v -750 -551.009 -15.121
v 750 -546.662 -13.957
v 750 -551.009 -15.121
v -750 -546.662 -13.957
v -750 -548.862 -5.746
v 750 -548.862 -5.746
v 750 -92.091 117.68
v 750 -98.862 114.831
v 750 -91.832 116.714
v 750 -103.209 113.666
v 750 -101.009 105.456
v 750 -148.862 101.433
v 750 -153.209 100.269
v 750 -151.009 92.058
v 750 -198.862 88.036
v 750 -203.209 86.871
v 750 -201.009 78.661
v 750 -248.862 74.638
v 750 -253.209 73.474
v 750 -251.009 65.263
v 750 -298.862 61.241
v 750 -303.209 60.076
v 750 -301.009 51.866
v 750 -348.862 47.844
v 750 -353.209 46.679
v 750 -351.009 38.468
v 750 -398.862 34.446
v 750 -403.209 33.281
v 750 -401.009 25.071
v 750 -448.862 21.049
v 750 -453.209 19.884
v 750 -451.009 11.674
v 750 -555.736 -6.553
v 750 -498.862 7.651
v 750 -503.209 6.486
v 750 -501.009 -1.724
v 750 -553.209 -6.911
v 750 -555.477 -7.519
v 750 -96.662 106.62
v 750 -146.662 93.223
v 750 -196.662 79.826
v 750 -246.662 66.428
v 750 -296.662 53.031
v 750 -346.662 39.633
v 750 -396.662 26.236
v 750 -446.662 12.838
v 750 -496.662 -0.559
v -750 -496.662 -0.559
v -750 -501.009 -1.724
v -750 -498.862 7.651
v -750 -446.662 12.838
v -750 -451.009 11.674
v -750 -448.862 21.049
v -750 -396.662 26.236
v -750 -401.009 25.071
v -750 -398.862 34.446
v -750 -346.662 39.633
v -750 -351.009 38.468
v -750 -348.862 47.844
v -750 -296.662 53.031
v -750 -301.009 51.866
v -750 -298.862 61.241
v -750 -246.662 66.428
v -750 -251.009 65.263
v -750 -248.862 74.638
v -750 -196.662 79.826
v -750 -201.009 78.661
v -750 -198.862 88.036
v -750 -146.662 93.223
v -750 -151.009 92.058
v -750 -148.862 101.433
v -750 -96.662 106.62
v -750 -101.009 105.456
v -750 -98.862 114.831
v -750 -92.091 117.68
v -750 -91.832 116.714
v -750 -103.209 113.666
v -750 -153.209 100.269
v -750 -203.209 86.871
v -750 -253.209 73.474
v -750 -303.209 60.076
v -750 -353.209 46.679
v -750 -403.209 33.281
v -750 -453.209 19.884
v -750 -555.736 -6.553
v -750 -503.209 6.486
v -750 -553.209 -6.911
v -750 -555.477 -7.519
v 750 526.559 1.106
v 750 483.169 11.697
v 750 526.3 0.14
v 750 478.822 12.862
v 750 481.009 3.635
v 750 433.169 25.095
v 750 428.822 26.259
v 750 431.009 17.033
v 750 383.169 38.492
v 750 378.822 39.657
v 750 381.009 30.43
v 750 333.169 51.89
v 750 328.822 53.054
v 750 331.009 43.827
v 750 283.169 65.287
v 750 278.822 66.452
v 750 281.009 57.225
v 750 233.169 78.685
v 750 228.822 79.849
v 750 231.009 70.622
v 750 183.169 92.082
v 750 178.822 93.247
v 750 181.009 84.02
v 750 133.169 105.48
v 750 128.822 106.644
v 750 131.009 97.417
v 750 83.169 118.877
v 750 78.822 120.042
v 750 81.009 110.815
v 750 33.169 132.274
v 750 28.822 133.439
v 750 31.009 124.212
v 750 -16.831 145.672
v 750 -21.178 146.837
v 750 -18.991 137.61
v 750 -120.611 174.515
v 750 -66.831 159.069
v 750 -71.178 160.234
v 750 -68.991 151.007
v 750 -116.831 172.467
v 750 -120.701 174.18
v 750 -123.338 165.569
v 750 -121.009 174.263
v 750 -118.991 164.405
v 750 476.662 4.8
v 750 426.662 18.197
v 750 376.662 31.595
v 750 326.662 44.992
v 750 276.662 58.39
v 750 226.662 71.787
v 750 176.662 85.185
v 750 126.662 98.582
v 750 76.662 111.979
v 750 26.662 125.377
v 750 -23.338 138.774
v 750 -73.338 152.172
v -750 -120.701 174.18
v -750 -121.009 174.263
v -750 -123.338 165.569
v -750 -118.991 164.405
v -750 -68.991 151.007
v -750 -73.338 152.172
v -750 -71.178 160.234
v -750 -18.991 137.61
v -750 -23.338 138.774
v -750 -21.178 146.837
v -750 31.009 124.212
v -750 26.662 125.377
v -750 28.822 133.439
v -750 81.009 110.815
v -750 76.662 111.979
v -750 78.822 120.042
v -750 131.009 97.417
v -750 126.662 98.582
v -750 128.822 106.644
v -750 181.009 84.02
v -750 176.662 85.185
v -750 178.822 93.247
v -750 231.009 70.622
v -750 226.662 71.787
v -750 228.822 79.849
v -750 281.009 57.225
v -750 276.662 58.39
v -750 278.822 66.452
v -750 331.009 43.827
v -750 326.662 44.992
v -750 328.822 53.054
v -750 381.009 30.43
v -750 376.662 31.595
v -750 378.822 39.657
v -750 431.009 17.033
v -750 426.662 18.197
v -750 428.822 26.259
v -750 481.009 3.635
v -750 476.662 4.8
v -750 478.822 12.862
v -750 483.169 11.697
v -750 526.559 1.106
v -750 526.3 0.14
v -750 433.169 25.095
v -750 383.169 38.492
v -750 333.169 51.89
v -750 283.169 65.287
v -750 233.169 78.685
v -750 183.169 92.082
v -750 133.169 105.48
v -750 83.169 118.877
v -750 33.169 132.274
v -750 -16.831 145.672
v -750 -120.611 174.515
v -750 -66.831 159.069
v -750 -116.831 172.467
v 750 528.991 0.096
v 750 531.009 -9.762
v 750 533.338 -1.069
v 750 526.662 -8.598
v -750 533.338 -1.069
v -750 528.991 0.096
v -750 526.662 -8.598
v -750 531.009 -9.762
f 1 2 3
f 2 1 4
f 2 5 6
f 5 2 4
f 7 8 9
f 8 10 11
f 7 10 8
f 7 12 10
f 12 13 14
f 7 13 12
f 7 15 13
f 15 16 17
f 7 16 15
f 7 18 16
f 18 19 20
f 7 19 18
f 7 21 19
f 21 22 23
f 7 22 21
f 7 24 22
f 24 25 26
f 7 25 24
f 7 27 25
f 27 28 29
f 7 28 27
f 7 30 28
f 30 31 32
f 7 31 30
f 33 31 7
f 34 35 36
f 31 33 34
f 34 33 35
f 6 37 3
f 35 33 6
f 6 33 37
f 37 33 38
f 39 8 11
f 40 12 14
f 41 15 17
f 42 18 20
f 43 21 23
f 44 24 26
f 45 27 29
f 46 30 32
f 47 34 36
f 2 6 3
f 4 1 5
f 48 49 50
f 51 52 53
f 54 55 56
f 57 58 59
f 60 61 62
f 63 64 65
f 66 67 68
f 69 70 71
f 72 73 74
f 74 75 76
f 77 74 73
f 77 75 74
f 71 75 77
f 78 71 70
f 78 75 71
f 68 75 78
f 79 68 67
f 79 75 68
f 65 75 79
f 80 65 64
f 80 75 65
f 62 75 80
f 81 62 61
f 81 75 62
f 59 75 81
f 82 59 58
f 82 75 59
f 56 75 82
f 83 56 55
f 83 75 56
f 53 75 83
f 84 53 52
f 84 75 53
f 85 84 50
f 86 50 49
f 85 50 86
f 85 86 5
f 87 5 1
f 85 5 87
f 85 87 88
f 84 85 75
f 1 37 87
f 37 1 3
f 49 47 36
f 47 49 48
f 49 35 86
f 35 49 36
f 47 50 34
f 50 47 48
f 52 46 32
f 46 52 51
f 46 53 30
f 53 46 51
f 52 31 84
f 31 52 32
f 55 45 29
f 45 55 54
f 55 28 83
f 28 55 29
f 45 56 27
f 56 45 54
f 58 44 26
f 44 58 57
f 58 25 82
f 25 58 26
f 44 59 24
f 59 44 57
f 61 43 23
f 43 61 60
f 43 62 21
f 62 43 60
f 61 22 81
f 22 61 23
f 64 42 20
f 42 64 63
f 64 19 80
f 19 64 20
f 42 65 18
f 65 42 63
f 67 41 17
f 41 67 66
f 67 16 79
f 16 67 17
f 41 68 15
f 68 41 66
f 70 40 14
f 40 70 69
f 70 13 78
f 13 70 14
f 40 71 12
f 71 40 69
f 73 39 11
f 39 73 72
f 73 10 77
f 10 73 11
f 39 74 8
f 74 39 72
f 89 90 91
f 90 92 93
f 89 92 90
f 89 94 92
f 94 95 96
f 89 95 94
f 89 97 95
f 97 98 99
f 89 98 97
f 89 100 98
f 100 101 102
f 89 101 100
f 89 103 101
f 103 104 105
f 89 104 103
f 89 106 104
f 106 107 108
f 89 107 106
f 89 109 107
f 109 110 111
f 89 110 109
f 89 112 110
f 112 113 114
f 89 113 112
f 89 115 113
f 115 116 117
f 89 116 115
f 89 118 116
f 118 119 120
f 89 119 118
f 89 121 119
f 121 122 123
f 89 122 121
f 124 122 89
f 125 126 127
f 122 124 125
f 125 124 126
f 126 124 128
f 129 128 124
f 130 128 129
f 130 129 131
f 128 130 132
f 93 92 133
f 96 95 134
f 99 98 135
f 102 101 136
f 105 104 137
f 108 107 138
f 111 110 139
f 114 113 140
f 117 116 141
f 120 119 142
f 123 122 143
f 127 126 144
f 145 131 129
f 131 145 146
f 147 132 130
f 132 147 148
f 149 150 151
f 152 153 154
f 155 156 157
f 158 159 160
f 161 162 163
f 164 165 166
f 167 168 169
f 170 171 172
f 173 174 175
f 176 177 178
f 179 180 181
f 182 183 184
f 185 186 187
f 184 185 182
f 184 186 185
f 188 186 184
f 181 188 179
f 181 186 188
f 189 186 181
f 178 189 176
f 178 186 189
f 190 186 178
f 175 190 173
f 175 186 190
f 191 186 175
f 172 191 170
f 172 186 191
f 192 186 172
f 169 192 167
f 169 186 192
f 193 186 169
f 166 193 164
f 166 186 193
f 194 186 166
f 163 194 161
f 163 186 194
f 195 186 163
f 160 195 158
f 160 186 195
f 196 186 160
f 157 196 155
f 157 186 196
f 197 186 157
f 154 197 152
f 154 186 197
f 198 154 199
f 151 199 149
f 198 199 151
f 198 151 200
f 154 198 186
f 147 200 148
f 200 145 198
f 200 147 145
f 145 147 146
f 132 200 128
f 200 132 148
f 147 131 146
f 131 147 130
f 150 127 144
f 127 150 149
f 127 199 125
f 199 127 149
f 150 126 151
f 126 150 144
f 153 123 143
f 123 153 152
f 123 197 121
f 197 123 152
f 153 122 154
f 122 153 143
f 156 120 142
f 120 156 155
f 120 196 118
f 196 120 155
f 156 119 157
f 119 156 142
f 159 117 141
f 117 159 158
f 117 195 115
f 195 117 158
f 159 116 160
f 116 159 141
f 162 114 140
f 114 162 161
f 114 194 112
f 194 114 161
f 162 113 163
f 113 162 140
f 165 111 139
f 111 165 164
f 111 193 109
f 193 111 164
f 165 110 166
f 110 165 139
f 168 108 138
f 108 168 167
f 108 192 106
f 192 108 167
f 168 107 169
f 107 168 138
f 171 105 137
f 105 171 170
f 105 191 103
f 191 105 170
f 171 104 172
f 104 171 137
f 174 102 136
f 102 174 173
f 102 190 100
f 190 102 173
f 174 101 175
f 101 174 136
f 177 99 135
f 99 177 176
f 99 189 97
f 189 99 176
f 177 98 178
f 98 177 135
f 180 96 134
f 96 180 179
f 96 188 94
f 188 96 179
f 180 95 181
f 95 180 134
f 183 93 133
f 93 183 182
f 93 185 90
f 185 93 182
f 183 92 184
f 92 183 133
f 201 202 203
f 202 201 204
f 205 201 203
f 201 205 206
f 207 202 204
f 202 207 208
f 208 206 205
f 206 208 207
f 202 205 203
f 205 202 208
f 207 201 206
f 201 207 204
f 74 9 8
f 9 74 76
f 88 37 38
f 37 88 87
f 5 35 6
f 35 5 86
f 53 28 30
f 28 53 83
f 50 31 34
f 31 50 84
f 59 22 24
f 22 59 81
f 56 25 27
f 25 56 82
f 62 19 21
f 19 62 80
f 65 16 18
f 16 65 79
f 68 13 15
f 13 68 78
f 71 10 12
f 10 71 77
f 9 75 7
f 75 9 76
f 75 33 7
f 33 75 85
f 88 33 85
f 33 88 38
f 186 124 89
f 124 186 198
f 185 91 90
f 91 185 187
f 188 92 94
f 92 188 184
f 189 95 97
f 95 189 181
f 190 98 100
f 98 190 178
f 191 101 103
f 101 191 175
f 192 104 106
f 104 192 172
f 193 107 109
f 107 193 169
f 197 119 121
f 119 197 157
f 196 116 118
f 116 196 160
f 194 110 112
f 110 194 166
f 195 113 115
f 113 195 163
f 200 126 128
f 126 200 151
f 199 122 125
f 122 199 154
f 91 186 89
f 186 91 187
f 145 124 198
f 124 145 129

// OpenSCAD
module houseroof(width=800, length=1200) {
beam_height = 9;
beam_width = 4.5;  
roof_angle = 15;
front_lip = 150;
back_lip = 150;
side_lip = 150;
air_gap = 30;
    
beam_length = length + front_lip + back_lip;
part_width = width/2+side_lip;
cross_over_1 = 80;
cross_over_2 = 120;
    
for (pos = [-part_width:50:-cross_over_1]) {
  translate([(front_lip-back_lip)/2, pos, (pos+width/2)*tan(roof_angle)+air_gap]) rotate([roof_angle,0, 0]) cube([beam_length,beam_width,beam_height],center=true);
} 

for (pos = [-cross_over_2:50:part_width]) {
  translate([(front_lip-back_lip)/2, pos, (pos-width/2)*tan(-roof_angle)+air_gap]) rotate([-roof_angle,0, 0]) cube([beam_length,beam_width,beam_height],center=true);
}

metal_thickness = 1;

translate([(front_lip-back_lip)/2, 0, (width/2)*tan(roof_angle)+air_gap]) rotate([roof_angle,0, 0]) translate([0,-side_lip-2.3*cross_over_1/1,4.5]) cube([beam_length,width/2+cross_over_1, metal_thickness],center=true);

translate([(front_lip-back_lip)/2, 0, (0-width/2)*tan(-roof_angle)+air_gap+4.5]) rotate([-roof_angle,0, 0]) translate([0,side_lip+cross_over_2/2,0]) cube([beam_length,part_width+cross_over_2, metal_thickness],center=true);
}

houseroof();
